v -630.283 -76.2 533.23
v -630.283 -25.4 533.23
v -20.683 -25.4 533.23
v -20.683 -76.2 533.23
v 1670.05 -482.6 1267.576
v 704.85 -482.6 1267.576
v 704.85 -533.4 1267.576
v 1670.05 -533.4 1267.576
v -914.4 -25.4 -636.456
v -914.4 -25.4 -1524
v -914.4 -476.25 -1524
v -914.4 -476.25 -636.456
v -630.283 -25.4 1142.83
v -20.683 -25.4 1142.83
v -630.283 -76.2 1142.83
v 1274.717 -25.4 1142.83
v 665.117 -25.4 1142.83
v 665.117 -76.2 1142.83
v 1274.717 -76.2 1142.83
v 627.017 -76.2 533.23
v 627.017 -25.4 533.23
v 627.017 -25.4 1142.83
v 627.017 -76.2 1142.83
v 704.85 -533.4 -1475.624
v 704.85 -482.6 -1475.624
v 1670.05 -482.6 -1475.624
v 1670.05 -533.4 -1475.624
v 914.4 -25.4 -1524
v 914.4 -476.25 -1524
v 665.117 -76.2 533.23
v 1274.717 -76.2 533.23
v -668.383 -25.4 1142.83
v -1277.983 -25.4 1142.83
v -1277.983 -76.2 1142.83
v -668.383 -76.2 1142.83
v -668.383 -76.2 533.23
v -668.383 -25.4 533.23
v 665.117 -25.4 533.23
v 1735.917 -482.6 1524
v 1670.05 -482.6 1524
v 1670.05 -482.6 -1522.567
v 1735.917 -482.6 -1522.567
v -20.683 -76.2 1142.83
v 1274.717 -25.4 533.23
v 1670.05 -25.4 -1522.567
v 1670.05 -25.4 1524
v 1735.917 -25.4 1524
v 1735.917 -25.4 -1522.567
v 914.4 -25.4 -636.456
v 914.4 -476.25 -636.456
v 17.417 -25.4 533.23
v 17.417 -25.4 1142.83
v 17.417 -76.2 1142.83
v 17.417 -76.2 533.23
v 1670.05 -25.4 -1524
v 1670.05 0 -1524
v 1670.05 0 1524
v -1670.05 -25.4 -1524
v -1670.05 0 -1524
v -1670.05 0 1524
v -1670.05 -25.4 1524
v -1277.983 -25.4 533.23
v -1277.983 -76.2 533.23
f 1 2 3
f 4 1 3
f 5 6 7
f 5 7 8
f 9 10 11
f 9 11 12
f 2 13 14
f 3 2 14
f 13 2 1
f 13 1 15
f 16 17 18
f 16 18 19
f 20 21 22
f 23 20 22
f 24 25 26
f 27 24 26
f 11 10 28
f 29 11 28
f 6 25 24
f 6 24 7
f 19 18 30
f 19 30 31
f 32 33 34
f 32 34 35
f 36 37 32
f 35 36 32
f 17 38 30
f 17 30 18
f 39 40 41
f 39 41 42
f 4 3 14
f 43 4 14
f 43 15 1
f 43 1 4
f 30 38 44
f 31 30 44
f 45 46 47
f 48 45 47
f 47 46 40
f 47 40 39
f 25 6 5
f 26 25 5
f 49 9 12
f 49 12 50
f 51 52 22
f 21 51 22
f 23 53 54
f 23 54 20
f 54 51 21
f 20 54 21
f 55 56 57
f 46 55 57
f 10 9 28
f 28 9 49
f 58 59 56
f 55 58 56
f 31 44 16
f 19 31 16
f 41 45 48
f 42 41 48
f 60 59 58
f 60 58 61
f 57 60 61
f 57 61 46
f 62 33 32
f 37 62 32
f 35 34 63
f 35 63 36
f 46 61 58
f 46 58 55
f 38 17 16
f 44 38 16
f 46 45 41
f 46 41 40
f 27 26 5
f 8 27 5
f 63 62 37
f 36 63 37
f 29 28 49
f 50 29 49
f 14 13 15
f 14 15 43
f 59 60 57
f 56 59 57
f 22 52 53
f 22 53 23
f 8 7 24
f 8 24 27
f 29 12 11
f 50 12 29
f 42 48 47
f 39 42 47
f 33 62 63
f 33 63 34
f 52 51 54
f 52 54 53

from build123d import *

# Parameters (mm, degrees)
F0_W     = 3340.1
F0_H     = 3048
F1_DEPTH = 25.4
F2_W     = 609.6
F2_H     = 609.6
F3_DEPTH = 50.8
F2_W_2   = 1828.8
F2_H_2   = 887.543977
F4_DEPTH = 450.85
F2_W_3   = 65.866615
F2_H_3   = 3046.567153
F5_DEPTH = 457.2
F6_W     = 965.2
F6_H     = 2743.2
F7_DEPTH = 50.8


with BuildPart() as f1:
    # F0 (on Front) → F1 (new body)
    with BuildSketch(Plane.XZ):
        Rectangle(F0_W, F0_H)
    extrude(amount=F1_DEPTH)


with BuildPart() as f3:
    # F2 (on face) → F3 (new body)
    with BuildSketch(Plane.XZ.offset(25.4)):
        with Locations((-973.182738, 838.029981)):
            Rectangle(F2_W, F2_H)
        with Locations((-325.482738, 838.029981)):
            Rectangle(F2_W, F2_H)
        with Locations((322.217262, 838.029981)):
            Rectangle(F2_W, F2_H)
        with Locations((969.917262, 838.029981)):
            Rectangle(F2_W, F2_H)
    extrude(amount=F3_DEPTH)


with BuildPart() as f4:
    # F2 (on face) → F4 (new body)
    with BuildSketch(Plane.XZ.offset(25.4)):
        with Locations((0, -1080.228011)):
            Rectangle(F2_W_2, F2_H_2)
    extrude(amount=F4_DEPTH)


with BuildPart() as f5:
    # F2 (on face) → F5 (new body)
    with BuildSketch(Plane.XZ.offset(25.4)):
        with Locations((1702.983307, 0.716424)):
            Rectangle(F2_W_3, F2_H_3)
    extrude(amount=F5_DEPTH)


with BuildPart() as f7:
    # F6 (on face) → F7 (new body)
    with BuildSketch(Plane.XZ.offset(482.6)):
        with Locations((1187.45, -104.024204)):
            Rectangle(F6_W, F6_H)
    extrude(amount=F7_DEPTH)


solid = Compound([f1.part, f3.part, f4.part, f5.part, f7.part])
